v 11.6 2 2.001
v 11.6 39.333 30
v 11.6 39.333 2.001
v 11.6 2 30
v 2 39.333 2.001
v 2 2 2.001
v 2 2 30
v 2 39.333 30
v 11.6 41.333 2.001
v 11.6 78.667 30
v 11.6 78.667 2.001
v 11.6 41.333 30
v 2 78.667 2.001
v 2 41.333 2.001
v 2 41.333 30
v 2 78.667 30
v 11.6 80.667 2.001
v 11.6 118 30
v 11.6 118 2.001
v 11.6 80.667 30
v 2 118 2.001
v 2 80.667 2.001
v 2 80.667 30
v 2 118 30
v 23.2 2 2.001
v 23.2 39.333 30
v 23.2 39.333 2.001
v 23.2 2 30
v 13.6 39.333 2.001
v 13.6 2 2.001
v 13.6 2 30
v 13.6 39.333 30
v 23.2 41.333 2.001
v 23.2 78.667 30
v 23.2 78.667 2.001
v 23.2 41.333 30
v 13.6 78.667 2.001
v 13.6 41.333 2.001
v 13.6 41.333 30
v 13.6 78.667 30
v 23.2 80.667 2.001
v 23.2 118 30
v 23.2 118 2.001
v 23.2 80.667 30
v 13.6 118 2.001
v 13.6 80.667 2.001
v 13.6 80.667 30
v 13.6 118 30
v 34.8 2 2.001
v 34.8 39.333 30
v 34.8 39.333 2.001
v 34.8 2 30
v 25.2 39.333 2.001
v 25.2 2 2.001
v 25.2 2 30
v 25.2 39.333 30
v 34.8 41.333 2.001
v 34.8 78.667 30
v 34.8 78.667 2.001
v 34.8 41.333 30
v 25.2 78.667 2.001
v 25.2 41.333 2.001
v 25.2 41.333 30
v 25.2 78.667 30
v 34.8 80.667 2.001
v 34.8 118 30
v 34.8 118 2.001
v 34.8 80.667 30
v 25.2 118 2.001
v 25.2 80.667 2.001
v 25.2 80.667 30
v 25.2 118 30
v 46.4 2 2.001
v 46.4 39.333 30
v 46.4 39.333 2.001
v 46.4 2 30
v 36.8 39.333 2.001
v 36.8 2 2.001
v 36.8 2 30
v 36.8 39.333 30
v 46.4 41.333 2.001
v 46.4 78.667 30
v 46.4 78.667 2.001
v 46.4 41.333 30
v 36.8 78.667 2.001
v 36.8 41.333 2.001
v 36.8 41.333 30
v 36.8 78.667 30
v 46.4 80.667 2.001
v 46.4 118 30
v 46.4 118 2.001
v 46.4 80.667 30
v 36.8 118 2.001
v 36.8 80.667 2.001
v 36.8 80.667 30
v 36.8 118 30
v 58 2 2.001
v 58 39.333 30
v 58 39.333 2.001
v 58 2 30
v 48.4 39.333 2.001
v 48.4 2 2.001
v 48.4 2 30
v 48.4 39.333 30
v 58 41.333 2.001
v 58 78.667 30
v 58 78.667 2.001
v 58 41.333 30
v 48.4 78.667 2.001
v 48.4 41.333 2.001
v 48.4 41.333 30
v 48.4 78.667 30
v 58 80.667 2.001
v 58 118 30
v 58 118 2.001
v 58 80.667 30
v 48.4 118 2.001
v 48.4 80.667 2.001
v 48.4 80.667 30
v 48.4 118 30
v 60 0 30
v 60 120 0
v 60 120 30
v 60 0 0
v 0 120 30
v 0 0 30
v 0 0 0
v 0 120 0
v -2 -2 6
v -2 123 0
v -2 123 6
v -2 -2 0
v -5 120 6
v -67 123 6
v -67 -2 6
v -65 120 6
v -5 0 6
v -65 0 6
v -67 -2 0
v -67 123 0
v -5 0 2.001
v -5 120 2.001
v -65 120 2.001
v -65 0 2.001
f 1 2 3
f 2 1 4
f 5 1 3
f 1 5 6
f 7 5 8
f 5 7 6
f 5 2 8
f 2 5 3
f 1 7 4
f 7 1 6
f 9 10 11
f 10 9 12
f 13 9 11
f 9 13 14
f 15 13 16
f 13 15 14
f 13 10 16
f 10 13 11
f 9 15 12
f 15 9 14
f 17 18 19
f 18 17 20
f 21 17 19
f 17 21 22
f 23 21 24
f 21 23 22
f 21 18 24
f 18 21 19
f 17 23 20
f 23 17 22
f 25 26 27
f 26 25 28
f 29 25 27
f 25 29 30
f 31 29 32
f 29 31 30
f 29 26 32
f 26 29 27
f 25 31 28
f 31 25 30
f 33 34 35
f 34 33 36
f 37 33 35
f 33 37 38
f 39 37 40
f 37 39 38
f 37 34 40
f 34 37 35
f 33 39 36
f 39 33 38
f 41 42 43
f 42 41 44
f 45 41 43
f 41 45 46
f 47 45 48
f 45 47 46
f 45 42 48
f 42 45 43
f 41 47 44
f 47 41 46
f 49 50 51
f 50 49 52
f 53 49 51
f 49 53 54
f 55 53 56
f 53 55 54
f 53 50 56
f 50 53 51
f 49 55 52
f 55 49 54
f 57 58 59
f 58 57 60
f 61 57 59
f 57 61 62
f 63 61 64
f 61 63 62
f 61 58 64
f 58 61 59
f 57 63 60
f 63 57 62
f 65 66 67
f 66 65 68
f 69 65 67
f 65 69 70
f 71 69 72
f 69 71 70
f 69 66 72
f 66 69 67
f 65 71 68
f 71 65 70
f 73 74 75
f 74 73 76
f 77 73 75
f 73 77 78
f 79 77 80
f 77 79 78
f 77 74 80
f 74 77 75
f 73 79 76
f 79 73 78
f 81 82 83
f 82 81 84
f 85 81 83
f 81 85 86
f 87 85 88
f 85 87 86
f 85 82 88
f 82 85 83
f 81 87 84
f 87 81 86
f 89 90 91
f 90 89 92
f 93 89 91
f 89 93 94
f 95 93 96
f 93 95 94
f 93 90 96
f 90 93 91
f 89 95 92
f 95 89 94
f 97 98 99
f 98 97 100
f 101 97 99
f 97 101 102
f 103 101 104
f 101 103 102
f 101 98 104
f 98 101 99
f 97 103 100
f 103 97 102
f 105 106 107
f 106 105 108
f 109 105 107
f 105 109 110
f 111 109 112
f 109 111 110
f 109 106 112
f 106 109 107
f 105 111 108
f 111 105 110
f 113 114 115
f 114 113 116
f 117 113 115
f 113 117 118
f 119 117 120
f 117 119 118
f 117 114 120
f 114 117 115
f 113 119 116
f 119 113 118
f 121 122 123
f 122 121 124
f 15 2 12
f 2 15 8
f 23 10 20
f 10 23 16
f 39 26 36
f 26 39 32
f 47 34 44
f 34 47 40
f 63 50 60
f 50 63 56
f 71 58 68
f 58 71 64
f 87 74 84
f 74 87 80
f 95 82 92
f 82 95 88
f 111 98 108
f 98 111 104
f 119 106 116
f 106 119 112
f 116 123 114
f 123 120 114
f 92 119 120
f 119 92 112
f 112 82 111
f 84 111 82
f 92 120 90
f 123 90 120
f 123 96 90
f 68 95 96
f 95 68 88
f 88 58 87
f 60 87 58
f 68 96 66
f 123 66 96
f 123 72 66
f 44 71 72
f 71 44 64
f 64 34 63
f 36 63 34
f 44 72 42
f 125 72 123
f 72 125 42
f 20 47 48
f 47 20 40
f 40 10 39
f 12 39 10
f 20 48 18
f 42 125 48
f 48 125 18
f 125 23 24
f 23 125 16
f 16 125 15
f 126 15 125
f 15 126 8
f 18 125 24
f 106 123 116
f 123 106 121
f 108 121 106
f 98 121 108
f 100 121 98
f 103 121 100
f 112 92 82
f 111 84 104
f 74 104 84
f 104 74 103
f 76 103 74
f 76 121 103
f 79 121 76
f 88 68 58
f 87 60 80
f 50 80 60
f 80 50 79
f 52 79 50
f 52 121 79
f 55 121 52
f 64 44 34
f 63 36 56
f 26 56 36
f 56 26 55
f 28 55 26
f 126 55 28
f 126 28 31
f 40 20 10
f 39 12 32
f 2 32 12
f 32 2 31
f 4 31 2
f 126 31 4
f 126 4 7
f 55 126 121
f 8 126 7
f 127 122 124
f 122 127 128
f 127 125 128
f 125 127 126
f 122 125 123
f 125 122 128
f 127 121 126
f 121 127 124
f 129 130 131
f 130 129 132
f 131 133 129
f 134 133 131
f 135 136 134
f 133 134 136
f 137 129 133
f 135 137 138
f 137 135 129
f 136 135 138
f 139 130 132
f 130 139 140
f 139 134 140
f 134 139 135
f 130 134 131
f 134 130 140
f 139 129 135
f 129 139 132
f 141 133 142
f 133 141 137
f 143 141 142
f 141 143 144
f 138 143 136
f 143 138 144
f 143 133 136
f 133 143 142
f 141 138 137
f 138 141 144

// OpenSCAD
//Box Depth (X)
x=60;

//Box Thickness (Y)
y=120;

//Box Height (Z)
z=30;

//Box Wall Thickness
h=2;

//Number of Rows
r=5;

//Number of Columns
c=3;

$fn=50;

module Body()
{cube([x,y,z]);}

module Lid()
{difference(){
    cube([x+1+2*h,y+1+2*h,z/5]);
    translate([h,h,h+.001])cube([x,y,(z/5-h)]);
    }
}

module Hole (){
cube([((x-h-r*(h))/r),(y-h-c*(h))/(c),z-h]);}

module Pattern (){
    for (i=[1:r]){
        for (j=[1:c]){
            translate ([h*(i)+(i-1)*(x-h-r*(h))/r,h*(j)+(j-1)*(y-h-c*(h))/(c),h+.001])Hole();
        }
    }}
difference ()
{Body();
    Pattern();}

translate ([-x-5-h,-h,0])Lid();   
    
